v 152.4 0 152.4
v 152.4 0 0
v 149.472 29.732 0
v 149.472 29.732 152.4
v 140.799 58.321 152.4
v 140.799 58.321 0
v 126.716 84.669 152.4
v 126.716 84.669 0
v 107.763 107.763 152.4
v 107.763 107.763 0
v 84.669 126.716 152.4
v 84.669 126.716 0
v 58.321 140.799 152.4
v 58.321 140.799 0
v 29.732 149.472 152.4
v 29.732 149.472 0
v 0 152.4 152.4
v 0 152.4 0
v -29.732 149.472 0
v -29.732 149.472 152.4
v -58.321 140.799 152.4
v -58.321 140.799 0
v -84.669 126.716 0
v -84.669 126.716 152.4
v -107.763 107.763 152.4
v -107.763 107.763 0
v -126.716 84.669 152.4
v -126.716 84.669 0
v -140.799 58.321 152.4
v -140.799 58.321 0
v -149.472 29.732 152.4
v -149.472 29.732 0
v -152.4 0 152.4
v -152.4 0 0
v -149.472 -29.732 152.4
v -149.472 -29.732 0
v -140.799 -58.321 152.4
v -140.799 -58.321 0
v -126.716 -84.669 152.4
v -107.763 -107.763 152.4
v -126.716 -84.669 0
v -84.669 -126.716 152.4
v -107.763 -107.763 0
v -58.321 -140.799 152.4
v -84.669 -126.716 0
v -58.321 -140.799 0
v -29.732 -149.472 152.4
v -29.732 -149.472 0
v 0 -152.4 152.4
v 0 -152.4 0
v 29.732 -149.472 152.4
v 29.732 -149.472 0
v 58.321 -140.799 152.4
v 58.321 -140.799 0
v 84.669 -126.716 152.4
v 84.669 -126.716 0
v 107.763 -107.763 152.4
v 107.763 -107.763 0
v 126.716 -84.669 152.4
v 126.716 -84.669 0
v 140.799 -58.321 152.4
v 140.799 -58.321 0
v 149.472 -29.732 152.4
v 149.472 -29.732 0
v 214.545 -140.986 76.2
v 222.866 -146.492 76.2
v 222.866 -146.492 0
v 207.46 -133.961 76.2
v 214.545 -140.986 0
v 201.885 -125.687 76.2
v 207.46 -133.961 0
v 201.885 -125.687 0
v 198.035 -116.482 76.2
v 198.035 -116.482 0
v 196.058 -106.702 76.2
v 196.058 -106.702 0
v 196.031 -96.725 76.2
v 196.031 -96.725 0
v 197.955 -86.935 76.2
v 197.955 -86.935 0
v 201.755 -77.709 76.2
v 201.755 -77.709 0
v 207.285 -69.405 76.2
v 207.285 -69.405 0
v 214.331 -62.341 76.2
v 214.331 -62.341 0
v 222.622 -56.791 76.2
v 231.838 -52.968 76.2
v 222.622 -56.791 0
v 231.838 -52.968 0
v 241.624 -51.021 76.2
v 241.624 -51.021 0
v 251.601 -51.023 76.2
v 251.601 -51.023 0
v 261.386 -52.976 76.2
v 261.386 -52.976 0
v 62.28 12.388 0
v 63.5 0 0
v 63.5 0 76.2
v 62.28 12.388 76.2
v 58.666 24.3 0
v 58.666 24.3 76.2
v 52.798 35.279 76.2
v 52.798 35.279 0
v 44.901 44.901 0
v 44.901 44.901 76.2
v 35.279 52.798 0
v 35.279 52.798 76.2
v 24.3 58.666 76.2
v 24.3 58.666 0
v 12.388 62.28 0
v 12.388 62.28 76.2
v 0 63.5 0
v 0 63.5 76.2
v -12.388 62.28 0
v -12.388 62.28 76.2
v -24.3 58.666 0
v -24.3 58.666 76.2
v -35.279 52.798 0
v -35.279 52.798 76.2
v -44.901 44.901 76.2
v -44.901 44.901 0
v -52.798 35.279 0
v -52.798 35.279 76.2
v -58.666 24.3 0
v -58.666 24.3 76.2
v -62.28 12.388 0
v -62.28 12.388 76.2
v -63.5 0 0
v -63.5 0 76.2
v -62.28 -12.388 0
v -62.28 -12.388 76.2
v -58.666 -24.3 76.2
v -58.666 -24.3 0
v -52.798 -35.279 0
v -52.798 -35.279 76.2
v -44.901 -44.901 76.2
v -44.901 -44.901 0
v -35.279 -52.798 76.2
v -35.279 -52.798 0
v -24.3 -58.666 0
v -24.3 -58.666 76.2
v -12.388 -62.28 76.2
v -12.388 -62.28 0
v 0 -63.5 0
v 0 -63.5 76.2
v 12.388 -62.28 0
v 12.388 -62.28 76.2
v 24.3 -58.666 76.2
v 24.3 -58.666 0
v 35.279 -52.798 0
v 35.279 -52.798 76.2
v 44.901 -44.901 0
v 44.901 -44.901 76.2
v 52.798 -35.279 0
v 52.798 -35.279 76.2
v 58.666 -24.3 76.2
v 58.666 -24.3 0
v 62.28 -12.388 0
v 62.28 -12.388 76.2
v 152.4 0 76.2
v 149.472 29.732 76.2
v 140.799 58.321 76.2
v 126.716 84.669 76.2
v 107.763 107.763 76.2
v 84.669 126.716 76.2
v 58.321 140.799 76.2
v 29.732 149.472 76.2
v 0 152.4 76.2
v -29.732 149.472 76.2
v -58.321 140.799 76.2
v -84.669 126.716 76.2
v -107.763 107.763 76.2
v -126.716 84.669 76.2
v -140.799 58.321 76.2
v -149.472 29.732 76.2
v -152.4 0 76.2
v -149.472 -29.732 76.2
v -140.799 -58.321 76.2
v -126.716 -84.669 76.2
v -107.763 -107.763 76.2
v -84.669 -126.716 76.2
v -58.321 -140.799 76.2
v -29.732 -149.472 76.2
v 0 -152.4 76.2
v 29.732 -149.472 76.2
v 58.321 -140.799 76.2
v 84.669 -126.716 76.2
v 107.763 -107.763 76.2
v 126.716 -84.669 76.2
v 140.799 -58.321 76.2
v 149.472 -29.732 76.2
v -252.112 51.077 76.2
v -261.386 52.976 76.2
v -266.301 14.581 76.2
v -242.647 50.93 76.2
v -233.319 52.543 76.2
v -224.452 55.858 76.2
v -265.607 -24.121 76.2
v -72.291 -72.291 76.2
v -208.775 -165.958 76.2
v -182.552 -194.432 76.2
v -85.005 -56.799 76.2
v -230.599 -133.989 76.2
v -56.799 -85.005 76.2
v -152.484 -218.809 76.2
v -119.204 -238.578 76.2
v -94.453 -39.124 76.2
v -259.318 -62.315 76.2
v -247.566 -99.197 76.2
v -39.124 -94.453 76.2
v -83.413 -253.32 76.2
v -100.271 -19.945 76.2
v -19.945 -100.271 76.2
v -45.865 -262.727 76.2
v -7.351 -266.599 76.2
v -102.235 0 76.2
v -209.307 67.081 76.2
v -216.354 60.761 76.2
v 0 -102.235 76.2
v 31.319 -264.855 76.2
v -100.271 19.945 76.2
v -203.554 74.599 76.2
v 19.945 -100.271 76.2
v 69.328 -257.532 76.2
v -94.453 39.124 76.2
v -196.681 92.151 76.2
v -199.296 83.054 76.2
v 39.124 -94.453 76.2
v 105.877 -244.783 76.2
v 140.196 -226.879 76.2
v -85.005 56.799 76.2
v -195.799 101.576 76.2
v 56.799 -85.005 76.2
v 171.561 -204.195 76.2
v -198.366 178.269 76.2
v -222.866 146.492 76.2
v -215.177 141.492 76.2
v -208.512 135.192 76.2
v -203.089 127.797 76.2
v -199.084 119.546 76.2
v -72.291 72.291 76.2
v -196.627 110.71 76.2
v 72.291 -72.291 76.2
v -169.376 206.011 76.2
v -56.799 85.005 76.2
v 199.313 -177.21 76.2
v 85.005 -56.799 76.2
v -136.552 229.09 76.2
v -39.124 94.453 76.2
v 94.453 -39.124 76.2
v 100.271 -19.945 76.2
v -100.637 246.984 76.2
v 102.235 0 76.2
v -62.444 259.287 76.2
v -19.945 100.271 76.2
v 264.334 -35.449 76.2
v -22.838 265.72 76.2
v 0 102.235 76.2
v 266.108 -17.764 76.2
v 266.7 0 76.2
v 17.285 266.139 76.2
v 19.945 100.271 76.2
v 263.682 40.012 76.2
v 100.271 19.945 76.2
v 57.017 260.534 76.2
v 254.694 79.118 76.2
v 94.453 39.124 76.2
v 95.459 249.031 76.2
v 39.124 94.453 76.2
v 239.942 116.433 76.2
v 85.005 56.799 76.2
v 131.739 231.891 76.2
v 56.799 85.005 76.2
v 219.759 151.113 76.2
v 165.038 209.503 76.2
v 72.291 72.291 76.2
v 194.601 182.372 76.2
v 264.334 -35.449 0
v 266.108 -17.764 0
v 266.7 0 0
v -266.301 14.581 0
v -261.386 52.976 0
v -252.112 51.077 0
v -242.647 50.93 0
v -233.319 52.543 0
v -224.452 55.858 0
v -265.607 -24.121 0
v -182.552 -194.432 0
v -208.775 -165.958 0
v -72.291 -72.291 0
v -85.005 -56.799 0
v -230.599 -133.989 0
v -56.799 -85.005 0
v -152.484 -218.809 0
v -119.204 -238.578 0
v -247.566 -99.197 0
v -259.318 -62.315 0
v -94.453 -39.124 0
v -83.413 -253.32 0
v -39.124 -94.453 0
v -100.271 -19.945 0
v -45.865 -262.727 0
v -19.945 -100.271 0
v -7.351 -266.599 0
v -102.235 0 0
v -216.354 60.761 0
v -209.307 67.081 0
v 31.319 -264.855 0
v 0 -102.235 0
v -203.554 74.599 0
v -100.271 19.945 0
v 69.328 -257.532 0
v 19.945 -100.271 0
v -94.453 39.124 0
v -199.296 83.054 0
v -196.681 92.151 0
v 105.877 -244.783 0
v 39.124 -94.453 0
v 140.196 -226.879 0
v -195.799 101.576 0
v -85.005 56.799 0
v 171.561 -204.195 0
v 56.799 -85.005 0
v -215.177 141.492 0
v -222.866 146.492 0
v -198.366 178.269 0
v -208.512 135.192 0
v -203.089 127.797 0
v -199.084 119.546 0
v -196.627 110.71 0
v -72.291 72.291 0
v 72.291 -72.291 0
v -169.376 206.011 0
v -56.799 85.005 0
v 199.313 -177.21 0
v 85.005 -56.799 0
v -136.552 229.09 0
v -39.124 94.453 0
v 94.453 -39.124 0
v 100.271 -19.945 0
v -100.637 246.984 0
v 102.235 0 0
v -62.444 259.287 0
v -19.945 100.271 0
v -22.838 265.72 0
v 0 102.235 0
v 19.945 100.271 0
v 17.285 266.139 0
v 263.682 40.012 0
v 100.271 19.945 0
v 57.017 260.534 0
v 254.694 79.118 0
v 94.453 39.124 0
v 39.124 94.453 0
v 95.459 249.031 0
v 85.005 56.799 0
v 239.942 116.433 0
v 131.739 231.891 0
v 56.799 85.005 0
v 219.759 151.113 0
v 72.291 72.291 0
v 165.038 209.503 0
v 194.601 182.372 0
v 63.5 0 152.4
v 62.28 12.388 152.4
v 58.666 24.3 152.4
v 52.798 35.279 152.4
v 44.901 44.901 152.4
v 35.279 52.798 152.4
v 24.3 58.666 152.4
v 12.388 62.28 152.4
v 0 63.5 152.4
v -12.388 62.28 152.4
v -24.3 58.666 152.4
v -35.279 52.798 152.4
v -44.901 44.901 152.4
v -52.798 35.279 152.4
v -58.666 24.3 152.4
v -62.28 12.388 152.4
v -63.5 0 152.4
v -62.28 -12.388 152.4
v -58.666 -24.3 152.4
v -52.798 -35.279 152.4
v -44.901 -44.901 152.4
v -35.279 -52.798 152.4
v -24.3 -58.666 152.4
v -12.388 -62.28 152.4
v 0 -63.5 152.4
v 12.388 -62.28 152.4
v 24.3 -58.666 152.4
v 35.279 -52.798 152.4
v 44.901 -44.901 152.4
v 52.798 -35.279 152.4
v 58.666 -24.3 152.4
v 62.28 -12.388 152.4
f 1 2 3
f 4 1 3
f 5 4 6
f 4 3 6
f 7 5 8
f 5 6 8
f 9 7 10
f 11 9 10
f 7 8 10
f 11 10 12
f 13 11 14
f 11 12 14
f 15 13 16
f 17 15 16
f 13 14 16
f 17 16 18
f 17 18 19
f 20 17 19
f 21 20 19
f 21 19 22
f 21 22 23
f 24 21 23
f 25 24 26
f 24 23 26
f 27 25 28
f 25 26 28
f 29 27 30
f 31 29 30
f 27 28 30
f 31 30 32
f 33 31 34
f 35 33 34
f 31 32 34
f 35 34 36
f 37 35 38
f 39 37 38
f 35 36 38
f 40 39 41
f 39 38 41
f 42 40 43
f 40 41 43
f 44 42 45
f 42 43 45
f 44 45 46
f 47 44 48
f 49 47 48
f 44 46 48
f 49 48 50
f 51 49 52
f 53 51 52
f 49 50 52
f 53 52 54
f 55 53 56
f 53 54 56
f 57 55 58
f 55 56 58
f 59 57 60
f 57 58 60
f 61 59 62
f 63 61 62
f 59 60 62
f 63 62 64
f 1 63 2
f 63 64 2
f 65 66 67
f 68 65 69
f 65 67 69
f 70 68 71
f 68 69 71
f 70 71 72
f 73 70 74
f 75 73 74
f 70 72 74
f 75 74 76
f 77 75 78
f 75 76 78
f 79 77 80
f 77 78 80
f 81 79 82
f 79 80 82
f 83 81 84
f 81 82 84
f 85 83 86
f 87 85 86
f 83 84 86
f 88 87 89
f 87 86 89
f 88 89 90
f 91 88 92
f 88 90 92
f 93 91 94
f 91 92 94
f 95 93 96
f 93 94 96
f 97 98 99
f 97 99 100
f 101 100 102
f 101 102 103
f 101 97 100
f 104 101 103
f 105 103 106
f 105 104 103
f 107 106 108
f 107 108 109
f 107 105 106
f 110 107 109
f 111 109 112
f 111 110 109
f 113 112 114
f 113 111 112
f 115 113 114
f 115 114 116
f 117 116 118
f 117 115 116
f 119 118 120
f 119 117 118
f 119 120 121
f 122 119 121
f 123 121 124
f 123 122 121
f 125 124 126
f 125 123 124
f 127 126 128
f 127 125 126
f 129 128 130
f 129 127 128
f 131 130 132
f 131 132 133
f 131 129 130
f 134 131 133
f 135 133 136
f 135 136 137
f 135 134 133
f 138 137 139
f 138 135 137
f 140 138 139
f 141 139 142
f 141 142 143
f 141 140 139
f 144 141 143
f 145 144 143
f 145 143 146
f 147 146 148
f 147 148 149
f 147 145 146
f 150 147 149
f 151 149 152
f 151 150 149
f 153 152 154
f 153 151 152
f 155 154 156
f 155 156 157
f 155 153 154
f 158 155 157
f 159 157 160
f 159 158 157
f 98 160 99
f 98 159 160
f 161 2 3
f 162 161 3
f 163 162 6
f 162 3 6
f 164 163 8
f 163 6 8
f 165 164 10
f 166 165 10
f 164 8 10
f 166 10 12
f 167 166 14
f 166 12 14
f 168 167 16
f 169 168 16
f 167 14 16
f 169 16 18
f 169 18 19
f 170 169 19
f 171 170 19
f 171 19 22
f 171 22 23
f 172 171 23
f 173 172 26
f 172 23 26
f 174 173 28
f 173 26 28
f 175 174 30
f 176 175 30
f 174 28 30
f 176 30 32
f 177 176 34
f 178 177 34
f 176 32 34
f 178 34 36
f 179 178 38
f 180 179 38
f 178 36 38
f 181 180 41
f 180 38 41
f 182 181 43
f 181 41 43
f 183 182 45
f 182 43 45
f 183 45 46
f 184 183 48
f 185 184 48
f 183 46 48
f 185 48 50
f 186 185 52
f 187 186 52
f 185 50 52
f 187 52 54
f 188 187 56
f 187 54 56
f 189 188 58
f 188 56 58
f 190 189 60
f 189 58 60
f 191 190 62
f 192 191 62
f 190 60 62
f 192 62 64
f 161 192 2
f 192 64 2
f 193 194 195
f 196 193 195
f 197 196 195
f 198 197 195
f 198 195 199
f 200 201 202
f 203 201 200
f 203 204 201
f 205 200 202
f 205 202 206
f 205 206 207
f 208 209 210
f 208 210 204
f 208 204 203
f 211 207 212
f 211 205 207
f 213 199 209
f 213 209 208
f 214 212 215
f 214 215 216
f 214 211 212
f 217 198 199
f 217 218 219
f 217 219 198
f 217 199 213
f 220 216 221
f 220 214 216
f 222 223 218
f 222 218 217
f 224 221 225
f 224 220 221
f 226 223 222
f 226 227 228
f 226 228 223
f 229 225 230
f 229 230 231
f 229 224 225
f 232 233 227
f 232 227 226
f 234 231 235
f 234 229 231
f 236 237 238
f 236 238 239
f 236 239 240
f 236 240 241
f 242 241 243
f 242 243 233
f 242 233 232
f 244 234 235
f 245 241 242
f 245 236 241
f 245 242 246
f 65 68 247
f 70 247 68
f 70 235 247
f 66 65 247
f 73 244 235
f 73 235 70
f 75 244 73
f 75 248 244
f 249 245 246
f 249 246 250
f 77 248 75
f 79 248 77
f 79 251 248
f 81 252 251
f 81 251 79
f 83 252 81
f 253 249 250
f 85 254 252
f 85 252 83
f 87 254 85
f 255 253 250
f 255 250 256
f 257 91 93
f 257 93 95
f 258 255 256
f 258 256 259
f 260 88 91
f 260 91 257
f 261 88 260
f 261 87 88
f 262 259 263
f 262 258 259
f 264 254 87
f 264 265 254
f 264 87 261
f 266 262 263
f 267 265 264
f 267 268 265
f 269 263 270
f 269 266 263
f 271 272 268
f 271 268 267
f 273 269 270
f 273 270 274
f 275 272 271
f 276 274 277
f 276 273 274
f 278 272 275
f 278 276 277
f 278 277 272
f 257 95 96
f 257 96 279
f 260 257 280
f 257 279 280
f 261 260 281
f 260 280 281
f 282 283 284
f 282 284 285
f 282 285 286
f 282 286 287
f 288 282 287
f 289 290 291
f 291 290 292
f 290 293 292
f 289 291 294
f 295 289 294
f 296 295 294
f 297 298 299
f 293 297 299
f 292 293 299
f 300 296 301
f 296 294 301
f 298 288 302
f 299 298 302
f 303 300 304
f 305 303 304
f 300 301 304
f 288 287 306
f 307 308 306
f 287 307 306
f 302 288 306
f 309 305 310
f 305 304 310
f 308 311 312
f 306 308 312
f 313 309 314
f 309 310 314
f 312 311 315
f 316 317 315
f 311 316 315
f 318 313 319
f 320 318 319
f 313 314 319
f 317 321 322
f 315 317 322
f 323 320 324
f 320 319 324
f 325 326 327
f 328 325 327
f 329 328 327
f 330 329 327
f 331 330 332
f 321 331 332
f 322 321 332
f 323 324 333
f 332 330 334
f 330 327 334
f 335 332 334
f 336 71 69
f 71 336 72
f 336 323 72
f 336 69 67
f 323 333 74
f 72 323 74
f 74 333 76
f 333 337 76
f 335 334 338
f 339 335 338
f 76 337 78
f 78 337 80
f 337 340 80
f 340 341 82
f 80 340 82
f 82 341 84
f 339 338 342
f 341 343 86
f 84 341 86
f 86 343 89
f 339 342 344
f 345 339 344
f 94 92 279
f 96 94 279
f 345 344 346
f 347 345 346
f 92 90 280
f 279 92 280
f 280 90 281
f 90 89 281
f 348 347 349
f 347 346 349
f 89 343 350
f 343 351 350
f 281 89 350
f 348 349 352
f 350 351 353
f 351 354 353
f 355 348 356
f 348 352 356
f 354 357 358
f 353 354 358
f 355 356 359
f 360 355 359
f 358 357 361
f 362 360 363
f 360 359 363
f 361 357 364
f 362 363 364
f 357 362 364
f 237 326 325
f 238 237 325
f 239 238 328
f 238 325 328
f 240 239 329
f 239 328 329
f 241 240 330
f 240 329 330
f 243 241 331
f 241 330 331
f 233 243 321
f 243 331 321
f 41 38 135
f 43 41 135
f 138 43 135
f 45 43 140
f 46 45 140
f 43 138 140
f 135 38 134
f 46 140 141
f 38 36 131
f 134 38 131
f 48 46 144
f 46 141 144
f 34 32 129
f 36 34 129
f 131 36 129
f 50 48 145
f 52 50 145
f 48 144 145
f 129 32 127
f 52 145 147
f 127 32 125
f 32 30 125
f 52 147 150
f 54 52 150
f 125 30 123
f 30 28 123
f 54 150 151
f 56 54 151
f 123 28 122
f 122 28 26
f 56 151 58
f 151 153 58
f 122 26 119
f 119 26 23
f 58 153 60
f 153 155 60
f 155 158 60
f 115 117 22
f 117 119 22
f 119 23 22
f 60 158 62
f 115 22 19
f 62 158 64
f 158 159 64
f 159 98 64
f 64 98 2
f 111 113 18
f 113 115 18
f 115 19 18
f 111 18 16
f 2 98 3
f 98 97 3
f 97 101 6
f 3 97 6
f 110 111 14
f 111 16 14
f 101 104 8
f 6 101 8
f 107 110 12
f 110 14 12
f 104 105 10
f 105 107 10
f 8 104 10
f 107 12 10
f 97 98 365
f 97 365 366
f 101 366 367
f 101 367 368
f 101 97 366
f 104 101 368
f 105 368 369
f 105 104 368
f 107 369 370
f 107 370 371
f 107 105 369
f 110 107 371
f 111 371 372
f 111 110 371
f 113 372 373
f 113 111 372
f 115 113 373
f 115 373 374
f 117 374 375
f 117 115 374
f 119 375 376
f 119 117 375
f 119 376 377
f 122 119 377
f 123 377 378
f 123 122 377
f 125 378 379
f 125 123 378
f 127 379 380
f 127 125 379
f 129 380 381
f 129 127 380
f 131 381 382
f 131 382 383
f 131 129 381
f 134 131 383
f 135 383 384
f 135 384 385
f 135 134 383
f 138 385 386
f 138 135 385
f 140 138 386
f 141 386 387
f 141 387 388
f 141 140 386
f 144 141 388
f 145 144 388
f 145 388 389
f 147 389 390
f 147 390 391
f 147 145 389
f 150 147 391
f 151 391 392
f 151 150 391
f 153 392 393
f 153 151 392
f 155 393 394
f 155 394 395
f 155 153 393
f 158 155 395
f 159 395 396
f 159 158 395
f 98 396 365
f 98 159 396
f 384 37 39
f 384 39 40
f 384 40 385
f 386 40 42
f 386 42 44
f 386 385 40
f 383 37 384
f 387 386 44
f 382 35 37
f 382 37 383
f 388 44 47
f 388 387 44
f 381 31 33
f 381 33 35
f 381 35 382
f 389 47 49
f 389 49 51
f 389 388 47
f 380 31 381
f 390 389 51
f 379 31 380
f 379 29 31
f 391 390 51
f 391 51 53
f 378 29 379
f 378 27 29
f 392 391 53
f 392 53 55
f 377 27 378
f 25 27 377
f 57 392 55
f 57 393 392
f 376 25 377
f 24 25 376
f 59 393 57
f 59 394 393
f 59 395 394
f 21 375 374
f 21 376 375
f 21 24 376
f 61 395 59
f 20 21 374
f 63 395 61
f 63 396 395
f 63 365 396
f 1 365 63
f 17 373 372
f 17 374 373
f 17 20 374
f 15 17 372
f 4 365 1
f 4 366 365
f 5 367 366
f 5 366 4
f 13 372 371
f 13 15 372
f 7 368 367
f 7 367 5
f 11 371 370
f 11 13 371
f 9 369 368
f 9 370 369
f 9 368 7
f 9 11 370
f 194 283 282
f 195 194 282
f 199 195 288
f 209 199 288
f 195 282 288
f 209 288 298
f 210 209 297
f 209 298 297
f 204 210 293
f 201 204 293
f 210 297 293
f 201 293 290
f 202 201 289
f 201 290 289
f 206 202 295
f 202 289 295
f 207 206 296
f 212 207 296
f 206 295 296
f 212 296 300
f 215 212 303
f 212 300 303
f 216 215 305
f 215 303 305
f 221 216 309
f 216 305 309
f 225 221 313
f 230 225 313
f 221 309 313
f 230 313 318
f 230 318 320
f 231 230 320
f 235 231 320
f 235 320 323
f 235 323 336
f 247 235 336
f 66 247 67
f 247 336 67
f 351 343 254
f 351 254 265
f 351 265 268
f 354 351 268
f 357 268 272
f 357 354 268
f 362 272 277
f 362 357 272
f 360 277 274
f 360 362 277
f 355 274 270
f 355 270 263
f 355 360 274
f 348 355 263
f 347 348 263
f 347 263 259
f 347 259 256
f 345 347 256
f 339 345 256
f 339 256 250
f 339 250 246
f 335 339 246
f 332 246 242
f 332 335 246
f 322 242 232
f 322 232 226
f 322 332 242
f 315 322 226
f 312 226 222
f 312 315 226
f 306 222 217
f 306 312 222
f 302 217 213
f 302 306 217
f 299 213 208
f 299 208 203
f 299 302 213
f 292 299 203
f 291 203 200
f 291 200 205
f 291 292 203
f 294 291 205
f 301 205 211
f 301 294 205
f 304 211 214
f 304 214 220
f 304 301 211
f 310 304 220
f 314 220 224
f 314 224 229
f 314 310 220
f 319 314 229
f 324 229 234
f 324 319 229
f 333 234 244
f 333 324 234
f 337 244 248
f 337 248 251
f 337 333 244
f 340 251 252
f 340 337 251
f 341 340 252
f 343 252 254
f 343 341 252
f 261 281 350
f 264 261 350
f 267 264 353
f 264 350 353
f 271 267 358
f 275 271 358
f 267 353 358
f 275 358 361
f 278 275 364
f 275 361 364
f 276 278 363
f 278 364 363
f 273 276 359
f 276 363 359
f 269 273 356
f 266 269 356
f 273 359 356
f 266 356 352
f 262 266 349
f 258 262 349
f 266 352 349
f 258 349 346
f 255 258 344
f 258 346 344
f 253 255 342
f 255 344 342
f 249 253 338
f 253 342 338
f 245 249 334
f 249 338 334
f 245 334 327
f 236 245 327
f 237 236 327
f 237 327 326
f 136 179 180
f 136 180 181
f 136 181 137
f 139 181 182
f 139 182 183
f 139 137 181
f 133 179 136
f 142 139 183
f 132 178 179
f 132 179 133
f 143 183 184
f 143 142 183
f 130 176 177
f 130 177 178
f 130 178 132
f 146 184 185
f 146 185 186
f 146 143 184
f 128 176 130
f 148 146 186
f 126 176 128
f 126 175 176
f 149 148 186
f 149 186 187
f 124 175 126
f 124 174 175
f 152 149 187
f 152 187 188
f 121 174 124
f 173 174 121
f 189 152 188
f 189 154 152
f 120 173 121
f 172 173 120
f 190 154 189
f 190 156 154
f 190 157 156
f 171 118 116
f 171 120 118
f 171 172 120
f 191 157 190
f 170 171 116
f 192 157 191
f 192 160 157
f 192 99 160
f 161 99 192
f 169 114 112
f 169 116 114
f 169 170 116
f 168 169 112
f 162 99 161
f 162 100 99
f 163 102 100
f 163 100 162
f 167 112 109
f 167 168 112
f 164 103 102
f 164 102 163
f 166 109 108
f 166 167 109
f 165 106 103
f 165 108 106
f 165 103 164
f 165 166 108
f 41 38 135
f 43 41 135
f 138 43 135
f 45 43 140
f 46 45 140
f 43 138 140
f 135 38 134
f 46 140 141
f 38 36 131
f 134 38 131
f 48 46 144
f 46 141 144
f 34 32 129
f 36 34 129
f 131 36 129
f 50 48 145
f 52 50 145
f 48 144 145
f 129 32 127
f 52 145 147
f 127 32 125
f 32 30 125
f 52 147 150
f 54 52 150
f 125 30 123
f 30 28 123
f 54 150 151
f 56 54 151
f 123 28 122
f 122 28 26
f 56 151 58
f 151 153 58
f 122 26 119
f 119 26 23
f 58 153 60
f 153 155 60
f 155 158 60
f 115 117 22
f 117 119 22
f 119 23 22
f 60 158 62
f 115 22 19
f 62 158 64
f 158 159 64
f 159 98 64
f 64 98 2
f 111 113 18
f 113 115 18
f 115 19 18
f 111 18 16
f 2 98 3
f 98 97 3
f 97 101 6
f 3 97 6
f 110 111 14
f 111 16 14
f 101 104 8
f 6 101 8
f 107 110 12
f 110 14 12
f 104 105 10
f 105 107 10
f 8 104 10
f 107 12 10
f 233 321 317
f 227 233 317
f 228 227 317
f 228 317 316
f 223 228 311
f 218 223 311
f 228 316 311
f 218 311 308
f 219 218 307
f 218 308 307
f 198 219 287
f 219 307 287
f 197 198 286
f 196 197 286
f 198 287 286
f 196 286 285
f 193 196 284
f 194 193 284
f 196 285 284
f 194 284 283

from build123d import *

# Parameters (mm, degrees)
F0_R     = 152.4
F0_R_2   = 63.5
F1_DEPTH = 152.4
F2_R     = 102.235
F3_DEPTH = 76.2


with BuildPart() as f1:
    # F0 (on Top) → F1 (new body)
    with BuildSketch(Plane.XY):
        Circle(F0_R)
        Circle(F0_R_2, mode=Mode.SUBTRACT)
    extrude(amount=F1_DEPTH)


with BuildPart() as f3:
    # F2 (on Top) → F3 (new body)
    with BuildSketch(Plane.XY):
        with BuildLine():
            ThreePointArc((261.3855837432, -52.9760947147), (265.3680700313, -26.6209956208), (266.7, 0))
            ThreePointArc((266.7, 0), (76.4546170247, 255.506519556), (-222.8656658089, 146.4915868013))
            ThreePointArc((-222.8656658089, 146.4915868013), (-203.0887492847, 127.7965544811), (-195.7990774278, 101.576498324))
            ThreePointArc((-195.7990774278, 101.576498324), (-216.3543631856, 60.7610936291), (-261.3855837432, 52.9760947147))
            ThreePointArc((-261.3855837432, 52.9760947147), (-101.576498324, -246.5990774278), (222.8656658089, -146.4915868013))
            ThreePointArc((222.8656658089, -146.4915868013), (199.6278245844, -82.2285938813), (261.3855837432, -52.9760947147))
        make_face()
        Circle(F2_R, mode=Mode.SUBTRACT)
    extrude(amount=F3_DEPTH)


with BuildPart() as f3b:
    # F0 (on Top) → F3, piece 2 (new body)
    with BuildSketch(Plane.XY):
        Circle(F0_R)
        Circle(F0_R_2, mode=Mode.SUBTRACT)
    extrude(amount=F3_DEPTH)


solid = Compound([f1.part, f3.part, f3b.part])
